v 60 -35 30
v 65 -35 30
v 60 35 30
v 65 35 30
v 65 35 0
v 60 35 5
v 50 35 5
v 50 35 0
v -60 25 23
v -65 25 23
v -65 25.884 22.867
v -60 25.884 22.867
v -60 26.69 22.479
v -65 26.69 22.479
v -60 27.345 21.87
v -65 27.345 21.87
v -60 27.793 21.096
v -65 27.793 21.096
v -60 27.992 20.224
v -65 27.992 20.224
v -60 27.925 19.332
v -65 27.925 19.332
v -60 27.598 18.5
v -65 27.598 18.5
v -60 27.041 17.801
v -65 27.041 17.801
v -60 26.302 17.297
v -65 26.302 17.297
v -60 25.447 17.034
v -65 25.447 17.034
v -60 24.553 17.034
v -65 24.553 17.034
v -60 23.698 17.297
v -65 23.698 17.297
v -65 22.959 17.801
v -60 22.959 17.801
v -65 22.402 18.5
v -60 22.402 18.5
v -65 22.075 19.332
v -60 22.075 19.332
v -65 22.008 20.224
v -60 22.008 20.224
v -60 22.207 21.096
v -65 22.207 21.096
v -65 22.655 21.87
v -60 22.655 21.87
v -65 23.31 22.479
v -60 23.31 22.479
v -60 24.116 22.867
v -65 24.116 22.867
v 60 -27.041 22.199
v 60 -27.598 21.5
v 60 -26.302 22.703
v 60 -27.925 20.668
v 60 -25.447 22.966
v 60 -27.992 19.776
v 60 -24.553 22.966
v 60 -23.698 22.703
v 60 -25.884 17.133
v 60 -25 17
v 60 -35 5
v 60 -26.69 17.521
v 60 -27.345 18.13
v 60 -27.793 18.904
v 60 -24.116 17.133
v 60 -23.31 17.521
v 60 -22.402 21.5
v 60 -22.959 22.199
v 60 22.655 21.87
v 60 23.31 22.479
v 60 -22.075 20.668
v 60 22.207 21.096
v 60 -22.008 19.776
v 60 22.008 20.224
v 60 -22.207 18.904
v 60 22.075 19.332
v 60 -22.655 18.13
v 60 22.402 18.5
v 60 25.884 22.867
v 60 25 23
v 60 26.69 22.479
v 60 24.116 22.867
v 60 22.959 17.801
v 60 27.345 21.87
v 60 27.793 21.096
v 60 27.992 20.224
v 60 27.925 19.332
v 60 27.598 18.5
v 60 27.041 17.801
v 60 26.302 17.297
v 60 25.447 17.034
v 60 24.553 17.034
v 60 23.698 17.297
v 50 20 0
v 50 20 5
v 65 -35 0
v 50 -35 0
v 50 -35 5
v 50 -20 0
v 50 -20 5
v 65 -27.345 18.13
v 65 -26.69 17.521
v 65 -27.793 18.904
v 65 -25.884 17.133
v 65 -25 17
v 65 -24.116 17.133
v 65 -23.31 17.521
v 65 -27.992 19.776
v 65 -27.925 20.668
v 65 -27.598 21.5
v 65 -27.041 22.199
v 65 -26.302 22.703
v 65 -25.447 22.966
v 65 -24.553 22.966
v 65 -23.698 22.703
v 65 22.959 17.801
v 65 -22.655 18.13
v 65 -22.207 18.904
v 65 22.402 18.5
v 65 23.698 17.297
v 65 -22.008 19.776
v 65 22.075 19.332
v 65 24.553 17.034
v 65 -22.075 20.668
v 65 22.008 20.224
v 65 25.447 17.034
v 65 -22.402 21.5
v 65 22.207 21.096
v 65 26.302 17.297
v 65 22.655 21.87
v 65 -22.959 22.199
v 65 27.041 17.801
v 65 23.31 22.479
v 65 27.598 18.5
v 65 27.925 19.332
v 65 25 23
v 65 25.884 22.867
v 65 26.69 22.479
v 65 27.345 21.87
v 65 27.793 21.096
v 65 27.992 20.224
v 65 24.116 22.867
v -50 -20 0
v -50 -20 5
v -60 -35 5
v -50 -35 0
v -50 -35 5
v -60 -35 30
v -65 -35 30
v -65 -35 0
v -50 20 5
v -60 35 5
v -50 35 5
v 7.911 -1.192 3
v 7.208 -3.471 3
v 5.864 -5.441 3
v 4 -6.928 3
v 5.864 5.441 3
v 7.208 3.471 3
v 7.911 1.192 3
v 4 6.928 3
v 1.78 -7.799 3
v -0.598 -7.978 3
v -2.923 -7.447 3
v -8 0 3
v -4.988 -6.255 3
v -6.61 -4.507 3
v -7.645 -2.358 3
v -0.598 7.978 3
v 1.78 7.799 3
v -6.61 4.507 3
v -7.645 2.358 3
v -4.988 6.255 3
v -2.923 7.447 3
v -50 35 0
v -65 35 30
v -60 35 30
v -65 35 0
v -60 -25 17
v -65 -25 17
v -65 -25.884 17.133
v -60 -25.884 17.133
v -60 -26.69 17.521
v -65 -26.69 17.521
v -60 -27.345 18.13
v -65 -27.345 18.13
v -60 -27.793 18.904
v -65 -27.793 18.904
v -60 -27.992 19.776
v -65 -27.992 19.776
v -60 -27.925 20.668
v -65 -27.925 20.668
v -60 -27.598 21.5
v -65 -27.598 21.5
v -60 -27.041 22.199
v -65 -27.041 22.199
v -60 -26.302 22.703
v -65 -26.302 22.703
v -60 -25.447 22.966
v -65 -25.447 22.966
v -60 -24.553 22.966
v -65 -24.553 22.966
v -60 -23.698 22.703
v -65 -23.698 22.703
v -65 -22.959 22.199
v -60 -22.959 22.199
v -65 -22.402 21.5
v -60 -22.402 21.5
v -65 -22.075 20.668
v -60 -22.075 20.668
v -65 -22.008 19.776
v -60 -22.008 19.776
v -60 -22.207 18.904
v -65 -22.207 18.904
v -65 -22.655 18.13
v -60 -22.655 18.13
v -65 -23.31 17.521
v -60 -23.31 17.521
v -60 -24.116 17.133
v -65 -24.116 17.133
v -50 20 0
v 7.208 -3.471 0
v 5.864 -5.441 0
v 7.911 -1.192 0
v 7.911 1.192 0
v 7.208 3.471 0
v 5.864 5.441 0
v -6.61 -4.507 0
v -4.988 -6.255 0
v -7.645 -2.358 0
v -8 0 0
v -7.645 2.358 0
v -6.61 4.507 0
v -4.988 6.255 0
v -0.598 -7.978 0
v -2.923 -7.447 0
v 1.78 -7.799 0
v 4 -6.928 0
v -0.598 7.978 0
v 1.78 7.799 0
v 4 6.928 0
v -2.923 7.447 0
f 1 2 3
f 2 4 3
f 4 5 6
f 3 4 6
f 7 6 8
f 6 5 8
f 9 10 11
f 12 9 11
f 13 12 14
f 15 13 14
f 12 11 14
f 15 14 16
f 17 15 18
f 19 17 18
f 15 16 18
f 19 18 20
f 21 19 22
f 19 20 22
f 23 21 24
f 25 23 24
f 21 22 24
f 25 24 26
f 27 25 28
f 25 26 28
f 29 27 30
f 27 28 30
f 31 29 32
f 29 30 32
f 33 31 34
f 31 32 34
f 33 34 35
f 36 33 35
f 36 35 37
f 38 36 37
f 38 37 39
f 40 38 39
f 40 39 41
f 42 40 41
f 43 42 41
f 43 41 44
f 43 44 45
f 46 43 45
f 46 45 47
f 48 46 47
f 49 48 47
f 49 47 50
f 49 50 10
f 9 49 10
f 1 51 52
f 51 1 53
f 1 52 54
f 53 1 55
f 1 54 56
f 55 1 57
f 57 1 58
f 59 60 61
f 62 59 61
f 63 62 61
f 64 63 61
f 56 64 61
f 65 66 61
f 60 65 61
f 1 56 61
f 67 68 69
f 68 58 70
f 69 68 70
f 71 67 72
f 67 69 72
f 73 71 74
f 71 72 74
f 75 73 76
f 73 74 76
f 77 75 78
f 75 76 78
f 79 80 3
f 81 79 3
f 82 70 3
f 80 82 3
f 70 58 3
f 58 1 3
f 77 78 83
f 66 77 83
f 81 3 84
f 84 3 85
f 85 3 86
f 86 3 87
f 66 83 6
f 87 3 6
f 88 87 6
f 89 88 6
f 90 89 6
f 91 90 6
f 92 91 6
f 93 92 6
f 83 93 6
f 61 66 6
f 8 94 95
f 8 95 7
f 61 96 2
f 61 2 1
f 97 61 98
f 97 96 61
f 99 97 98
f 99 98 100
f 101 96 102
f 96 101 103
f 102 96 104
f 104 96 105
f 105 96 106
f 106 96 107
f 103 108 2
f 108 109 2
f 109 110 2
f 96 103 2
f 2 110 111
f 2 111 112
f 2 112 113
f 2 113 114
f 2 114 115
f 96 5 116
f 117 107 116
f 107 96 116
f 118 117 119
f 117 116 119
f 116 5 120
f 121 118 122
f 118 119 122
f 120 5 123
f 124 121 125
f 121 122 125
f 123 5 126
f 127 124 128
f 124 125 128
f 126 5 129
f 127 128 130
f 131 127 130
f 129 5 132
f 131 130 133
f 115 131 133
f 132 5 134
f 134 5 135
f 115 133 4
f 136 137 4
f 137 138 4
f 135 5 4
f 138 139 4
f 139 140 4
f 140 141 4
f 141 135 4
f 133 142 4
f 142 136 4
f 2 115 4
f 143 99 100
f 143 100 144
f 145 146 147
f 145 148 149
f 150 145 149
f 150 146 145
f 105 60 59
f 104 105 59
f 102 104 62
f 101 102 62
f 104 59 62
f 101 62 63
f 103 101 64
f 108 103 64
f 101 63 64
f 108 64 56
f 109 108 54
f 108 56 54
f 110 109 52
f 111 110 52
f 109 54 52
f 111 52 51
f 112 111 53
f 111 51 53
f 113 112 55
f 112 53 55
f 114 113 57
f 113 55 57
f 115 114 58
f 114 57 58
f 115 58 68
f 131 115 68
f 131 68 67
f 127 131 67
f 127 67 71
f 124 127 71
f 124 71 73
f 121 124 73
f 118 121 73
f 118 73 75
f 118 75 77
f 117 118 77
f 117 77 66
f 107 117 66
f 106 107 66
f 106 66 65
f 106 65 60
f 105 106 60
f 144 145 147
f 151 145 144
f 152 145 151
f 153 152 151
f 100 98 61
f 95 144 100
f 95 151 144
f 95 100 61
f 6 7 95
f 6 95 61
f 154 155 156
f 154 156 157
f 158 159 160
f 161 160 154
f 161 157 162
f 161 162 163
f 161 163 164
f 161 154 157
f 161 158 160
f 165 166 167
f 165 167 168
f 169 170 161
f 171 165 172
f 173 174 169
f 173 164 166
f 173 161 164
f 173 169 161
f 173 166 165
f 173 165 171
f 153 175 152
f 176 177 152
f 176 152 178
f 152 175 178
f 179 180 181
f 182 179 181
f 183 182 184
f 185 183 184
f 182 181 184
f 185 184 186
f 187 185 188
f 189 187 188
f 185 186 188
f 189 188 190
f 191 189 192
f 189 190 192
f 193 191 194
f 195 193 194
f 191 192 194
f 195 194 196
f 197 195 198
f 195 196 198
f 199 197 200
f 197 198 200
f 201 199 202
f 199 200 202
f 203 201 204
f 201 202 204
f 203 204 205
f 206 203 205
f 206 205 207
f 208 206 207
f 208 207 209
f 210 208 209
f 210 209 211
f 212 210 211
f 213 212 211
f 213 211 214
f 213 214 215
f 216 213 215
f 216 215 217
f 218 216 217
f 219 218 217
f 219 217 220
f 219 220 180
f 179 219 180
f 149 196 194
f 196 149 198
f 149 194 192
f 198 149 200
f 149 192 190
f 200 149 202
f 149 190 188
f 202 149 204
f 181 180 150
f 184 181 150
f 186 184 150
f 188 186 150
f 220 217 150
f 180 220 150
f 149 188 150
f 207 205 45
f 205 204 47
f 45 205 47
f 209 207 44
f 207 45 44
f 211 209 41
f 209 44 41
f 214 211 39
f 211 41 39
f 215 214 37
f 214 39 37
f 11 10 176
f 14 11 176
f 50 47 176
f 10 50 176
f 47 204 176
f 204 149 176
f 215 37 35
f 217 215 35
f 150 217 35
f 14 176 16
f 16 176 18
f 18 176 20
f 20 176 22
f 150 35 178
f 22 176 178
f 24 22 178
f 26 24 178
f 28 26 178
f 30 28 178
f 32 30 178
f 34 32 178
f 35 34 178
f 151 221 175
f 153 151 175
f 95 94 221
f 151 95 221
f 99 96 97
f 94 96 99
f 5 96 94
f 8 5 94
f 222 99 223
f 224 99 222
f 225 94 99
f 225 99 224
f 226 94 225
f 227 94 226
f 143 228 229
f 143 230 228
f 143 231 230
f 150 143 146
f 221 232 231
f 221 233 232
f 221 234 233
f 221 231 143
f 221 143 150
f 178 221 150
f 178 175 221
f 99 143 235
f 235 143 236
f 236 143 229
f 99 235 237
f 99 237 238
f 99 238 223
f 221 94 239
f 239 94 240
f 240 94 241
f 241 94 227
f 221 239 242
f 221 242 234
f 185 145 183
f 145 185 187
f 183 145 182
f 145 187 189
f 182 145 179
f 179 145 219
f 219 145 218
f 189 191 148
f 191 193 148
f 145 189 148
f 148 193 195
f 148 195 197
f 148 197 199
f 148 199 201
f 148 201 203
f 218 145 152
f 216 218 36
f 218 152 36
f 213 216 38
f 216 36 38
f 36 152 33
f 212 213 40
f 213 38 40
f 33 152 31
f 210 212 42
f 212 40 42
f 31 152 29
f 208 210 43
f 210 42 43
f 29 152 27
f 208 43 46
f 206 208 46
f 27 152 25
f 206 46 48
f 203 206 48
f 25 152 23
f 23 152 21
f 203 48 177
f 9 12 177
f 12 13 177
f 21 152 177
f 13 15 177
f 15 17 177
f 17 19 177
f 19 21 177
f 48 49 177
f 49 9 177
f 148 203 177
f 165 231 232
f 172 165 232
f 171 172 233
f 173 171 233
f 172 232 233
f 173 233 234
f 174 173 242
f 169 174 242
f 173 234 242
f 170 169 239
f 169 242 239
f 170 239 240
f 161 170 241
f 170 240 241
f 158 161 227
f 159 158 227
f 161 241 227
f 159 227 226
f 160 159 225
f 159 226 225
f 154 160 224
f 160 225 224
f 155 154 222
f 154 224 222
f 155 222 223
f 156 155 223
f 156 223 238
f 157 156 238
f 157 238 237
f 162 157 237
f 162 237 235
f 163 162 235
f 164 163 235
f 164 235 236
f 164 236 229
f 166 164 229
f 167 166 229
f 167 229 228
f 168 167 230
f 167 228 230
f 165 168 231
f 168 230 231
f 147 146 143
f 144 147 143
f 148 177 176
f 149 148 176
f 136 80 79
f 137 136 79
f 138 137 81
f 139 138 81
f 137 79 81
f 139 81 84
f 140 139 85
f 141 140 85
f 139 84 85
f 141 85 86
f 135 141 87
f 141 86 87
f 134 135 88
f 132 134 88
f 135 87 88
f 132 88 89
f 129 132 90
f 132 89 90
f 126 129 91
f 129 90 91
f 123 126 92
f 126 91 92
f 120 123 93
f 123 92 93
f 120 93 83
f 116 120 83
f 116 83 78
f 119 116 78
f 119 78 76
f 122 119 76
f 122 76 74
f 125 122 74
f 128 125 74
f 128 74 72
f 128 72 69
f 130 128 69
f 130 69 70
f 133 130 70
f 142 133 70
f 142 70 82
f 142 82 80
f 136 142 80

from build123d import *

# Parameters (mm, degrees)
BOSS_EXTRUDE1_DEPTH = 35
SKETCH2_W           = 100
SKETCH2_H           = 15
CUT_EXTRUDE1_DEPTH  = 5
SKETCH3_R           = 3
CUT_EXTRUDE2_DEPTH  = 138.931142241
SKETCH4_R           = 8
CUT_EXTRUDE3_DEPTH  = 3


with BuildPart() as part:
    # Sketch1 → Boss-Extrude1 (new, symmetric)
    with BuildSketch(Plane(origin=(0, 0, 0), x_dir=(1, 0, 0), z_dir=(0, 1, 0))):
        Polygon((0, 0), (65, 0), (65, -30), (60, -30), (60, -5), (0, -5), (-60, -5), (-60, -30), (-65, -30), (-65, 0), align=None)
    extrude(amount=BOSS_EXTRUDE1_DEPTH, both=True)

    # Sketch2 → Cut-Extrude1 (cut)
    with BuildSketch(Plane(origin=(0, 0, 0), x_dir=(-1, 0, 0), z_dir=(0, 0, -1))):
        with Locations((0, -27.5)):
            Rectangle(SKETCH2_W, SKETCH2_H)
        with Locations((0, 27.5)):
            Rectangle(SKETCH2_W, SKETCH2_H)
    extrude(amount=-CUT_EXTRUDE1_DEPTH, mode=Mode.SUBTRACT)

    # Sketch3 → Cut-Extrude2 (cut, through all)
    with BuildSketch(Plane.ZY.offset(65)):
        with Locations((20, 25)):
            Circle(SKETCH3_R)
        with Locations(Location((20, -25, 0), (0, 0, 180))):
            Circle(SKETCH3_R)
    extrude(amount=-CUT_EXTRUDE2_DEPTH, mode=Mode.SUBTRACT)

    # Sketch4 → Cut-Extrude3 (cut)
    with BuildSketch(Plane(origin=(0, 0, 0), x_dir=(-1, 0, 0), z_dir=(0, 0, -1))):
        Circle(SKETCH4_R)
    extrude(amount=-CUT_EXTRUDE3_DEPTH, mode=Mode.SUBTRACT)


solid = part.part
